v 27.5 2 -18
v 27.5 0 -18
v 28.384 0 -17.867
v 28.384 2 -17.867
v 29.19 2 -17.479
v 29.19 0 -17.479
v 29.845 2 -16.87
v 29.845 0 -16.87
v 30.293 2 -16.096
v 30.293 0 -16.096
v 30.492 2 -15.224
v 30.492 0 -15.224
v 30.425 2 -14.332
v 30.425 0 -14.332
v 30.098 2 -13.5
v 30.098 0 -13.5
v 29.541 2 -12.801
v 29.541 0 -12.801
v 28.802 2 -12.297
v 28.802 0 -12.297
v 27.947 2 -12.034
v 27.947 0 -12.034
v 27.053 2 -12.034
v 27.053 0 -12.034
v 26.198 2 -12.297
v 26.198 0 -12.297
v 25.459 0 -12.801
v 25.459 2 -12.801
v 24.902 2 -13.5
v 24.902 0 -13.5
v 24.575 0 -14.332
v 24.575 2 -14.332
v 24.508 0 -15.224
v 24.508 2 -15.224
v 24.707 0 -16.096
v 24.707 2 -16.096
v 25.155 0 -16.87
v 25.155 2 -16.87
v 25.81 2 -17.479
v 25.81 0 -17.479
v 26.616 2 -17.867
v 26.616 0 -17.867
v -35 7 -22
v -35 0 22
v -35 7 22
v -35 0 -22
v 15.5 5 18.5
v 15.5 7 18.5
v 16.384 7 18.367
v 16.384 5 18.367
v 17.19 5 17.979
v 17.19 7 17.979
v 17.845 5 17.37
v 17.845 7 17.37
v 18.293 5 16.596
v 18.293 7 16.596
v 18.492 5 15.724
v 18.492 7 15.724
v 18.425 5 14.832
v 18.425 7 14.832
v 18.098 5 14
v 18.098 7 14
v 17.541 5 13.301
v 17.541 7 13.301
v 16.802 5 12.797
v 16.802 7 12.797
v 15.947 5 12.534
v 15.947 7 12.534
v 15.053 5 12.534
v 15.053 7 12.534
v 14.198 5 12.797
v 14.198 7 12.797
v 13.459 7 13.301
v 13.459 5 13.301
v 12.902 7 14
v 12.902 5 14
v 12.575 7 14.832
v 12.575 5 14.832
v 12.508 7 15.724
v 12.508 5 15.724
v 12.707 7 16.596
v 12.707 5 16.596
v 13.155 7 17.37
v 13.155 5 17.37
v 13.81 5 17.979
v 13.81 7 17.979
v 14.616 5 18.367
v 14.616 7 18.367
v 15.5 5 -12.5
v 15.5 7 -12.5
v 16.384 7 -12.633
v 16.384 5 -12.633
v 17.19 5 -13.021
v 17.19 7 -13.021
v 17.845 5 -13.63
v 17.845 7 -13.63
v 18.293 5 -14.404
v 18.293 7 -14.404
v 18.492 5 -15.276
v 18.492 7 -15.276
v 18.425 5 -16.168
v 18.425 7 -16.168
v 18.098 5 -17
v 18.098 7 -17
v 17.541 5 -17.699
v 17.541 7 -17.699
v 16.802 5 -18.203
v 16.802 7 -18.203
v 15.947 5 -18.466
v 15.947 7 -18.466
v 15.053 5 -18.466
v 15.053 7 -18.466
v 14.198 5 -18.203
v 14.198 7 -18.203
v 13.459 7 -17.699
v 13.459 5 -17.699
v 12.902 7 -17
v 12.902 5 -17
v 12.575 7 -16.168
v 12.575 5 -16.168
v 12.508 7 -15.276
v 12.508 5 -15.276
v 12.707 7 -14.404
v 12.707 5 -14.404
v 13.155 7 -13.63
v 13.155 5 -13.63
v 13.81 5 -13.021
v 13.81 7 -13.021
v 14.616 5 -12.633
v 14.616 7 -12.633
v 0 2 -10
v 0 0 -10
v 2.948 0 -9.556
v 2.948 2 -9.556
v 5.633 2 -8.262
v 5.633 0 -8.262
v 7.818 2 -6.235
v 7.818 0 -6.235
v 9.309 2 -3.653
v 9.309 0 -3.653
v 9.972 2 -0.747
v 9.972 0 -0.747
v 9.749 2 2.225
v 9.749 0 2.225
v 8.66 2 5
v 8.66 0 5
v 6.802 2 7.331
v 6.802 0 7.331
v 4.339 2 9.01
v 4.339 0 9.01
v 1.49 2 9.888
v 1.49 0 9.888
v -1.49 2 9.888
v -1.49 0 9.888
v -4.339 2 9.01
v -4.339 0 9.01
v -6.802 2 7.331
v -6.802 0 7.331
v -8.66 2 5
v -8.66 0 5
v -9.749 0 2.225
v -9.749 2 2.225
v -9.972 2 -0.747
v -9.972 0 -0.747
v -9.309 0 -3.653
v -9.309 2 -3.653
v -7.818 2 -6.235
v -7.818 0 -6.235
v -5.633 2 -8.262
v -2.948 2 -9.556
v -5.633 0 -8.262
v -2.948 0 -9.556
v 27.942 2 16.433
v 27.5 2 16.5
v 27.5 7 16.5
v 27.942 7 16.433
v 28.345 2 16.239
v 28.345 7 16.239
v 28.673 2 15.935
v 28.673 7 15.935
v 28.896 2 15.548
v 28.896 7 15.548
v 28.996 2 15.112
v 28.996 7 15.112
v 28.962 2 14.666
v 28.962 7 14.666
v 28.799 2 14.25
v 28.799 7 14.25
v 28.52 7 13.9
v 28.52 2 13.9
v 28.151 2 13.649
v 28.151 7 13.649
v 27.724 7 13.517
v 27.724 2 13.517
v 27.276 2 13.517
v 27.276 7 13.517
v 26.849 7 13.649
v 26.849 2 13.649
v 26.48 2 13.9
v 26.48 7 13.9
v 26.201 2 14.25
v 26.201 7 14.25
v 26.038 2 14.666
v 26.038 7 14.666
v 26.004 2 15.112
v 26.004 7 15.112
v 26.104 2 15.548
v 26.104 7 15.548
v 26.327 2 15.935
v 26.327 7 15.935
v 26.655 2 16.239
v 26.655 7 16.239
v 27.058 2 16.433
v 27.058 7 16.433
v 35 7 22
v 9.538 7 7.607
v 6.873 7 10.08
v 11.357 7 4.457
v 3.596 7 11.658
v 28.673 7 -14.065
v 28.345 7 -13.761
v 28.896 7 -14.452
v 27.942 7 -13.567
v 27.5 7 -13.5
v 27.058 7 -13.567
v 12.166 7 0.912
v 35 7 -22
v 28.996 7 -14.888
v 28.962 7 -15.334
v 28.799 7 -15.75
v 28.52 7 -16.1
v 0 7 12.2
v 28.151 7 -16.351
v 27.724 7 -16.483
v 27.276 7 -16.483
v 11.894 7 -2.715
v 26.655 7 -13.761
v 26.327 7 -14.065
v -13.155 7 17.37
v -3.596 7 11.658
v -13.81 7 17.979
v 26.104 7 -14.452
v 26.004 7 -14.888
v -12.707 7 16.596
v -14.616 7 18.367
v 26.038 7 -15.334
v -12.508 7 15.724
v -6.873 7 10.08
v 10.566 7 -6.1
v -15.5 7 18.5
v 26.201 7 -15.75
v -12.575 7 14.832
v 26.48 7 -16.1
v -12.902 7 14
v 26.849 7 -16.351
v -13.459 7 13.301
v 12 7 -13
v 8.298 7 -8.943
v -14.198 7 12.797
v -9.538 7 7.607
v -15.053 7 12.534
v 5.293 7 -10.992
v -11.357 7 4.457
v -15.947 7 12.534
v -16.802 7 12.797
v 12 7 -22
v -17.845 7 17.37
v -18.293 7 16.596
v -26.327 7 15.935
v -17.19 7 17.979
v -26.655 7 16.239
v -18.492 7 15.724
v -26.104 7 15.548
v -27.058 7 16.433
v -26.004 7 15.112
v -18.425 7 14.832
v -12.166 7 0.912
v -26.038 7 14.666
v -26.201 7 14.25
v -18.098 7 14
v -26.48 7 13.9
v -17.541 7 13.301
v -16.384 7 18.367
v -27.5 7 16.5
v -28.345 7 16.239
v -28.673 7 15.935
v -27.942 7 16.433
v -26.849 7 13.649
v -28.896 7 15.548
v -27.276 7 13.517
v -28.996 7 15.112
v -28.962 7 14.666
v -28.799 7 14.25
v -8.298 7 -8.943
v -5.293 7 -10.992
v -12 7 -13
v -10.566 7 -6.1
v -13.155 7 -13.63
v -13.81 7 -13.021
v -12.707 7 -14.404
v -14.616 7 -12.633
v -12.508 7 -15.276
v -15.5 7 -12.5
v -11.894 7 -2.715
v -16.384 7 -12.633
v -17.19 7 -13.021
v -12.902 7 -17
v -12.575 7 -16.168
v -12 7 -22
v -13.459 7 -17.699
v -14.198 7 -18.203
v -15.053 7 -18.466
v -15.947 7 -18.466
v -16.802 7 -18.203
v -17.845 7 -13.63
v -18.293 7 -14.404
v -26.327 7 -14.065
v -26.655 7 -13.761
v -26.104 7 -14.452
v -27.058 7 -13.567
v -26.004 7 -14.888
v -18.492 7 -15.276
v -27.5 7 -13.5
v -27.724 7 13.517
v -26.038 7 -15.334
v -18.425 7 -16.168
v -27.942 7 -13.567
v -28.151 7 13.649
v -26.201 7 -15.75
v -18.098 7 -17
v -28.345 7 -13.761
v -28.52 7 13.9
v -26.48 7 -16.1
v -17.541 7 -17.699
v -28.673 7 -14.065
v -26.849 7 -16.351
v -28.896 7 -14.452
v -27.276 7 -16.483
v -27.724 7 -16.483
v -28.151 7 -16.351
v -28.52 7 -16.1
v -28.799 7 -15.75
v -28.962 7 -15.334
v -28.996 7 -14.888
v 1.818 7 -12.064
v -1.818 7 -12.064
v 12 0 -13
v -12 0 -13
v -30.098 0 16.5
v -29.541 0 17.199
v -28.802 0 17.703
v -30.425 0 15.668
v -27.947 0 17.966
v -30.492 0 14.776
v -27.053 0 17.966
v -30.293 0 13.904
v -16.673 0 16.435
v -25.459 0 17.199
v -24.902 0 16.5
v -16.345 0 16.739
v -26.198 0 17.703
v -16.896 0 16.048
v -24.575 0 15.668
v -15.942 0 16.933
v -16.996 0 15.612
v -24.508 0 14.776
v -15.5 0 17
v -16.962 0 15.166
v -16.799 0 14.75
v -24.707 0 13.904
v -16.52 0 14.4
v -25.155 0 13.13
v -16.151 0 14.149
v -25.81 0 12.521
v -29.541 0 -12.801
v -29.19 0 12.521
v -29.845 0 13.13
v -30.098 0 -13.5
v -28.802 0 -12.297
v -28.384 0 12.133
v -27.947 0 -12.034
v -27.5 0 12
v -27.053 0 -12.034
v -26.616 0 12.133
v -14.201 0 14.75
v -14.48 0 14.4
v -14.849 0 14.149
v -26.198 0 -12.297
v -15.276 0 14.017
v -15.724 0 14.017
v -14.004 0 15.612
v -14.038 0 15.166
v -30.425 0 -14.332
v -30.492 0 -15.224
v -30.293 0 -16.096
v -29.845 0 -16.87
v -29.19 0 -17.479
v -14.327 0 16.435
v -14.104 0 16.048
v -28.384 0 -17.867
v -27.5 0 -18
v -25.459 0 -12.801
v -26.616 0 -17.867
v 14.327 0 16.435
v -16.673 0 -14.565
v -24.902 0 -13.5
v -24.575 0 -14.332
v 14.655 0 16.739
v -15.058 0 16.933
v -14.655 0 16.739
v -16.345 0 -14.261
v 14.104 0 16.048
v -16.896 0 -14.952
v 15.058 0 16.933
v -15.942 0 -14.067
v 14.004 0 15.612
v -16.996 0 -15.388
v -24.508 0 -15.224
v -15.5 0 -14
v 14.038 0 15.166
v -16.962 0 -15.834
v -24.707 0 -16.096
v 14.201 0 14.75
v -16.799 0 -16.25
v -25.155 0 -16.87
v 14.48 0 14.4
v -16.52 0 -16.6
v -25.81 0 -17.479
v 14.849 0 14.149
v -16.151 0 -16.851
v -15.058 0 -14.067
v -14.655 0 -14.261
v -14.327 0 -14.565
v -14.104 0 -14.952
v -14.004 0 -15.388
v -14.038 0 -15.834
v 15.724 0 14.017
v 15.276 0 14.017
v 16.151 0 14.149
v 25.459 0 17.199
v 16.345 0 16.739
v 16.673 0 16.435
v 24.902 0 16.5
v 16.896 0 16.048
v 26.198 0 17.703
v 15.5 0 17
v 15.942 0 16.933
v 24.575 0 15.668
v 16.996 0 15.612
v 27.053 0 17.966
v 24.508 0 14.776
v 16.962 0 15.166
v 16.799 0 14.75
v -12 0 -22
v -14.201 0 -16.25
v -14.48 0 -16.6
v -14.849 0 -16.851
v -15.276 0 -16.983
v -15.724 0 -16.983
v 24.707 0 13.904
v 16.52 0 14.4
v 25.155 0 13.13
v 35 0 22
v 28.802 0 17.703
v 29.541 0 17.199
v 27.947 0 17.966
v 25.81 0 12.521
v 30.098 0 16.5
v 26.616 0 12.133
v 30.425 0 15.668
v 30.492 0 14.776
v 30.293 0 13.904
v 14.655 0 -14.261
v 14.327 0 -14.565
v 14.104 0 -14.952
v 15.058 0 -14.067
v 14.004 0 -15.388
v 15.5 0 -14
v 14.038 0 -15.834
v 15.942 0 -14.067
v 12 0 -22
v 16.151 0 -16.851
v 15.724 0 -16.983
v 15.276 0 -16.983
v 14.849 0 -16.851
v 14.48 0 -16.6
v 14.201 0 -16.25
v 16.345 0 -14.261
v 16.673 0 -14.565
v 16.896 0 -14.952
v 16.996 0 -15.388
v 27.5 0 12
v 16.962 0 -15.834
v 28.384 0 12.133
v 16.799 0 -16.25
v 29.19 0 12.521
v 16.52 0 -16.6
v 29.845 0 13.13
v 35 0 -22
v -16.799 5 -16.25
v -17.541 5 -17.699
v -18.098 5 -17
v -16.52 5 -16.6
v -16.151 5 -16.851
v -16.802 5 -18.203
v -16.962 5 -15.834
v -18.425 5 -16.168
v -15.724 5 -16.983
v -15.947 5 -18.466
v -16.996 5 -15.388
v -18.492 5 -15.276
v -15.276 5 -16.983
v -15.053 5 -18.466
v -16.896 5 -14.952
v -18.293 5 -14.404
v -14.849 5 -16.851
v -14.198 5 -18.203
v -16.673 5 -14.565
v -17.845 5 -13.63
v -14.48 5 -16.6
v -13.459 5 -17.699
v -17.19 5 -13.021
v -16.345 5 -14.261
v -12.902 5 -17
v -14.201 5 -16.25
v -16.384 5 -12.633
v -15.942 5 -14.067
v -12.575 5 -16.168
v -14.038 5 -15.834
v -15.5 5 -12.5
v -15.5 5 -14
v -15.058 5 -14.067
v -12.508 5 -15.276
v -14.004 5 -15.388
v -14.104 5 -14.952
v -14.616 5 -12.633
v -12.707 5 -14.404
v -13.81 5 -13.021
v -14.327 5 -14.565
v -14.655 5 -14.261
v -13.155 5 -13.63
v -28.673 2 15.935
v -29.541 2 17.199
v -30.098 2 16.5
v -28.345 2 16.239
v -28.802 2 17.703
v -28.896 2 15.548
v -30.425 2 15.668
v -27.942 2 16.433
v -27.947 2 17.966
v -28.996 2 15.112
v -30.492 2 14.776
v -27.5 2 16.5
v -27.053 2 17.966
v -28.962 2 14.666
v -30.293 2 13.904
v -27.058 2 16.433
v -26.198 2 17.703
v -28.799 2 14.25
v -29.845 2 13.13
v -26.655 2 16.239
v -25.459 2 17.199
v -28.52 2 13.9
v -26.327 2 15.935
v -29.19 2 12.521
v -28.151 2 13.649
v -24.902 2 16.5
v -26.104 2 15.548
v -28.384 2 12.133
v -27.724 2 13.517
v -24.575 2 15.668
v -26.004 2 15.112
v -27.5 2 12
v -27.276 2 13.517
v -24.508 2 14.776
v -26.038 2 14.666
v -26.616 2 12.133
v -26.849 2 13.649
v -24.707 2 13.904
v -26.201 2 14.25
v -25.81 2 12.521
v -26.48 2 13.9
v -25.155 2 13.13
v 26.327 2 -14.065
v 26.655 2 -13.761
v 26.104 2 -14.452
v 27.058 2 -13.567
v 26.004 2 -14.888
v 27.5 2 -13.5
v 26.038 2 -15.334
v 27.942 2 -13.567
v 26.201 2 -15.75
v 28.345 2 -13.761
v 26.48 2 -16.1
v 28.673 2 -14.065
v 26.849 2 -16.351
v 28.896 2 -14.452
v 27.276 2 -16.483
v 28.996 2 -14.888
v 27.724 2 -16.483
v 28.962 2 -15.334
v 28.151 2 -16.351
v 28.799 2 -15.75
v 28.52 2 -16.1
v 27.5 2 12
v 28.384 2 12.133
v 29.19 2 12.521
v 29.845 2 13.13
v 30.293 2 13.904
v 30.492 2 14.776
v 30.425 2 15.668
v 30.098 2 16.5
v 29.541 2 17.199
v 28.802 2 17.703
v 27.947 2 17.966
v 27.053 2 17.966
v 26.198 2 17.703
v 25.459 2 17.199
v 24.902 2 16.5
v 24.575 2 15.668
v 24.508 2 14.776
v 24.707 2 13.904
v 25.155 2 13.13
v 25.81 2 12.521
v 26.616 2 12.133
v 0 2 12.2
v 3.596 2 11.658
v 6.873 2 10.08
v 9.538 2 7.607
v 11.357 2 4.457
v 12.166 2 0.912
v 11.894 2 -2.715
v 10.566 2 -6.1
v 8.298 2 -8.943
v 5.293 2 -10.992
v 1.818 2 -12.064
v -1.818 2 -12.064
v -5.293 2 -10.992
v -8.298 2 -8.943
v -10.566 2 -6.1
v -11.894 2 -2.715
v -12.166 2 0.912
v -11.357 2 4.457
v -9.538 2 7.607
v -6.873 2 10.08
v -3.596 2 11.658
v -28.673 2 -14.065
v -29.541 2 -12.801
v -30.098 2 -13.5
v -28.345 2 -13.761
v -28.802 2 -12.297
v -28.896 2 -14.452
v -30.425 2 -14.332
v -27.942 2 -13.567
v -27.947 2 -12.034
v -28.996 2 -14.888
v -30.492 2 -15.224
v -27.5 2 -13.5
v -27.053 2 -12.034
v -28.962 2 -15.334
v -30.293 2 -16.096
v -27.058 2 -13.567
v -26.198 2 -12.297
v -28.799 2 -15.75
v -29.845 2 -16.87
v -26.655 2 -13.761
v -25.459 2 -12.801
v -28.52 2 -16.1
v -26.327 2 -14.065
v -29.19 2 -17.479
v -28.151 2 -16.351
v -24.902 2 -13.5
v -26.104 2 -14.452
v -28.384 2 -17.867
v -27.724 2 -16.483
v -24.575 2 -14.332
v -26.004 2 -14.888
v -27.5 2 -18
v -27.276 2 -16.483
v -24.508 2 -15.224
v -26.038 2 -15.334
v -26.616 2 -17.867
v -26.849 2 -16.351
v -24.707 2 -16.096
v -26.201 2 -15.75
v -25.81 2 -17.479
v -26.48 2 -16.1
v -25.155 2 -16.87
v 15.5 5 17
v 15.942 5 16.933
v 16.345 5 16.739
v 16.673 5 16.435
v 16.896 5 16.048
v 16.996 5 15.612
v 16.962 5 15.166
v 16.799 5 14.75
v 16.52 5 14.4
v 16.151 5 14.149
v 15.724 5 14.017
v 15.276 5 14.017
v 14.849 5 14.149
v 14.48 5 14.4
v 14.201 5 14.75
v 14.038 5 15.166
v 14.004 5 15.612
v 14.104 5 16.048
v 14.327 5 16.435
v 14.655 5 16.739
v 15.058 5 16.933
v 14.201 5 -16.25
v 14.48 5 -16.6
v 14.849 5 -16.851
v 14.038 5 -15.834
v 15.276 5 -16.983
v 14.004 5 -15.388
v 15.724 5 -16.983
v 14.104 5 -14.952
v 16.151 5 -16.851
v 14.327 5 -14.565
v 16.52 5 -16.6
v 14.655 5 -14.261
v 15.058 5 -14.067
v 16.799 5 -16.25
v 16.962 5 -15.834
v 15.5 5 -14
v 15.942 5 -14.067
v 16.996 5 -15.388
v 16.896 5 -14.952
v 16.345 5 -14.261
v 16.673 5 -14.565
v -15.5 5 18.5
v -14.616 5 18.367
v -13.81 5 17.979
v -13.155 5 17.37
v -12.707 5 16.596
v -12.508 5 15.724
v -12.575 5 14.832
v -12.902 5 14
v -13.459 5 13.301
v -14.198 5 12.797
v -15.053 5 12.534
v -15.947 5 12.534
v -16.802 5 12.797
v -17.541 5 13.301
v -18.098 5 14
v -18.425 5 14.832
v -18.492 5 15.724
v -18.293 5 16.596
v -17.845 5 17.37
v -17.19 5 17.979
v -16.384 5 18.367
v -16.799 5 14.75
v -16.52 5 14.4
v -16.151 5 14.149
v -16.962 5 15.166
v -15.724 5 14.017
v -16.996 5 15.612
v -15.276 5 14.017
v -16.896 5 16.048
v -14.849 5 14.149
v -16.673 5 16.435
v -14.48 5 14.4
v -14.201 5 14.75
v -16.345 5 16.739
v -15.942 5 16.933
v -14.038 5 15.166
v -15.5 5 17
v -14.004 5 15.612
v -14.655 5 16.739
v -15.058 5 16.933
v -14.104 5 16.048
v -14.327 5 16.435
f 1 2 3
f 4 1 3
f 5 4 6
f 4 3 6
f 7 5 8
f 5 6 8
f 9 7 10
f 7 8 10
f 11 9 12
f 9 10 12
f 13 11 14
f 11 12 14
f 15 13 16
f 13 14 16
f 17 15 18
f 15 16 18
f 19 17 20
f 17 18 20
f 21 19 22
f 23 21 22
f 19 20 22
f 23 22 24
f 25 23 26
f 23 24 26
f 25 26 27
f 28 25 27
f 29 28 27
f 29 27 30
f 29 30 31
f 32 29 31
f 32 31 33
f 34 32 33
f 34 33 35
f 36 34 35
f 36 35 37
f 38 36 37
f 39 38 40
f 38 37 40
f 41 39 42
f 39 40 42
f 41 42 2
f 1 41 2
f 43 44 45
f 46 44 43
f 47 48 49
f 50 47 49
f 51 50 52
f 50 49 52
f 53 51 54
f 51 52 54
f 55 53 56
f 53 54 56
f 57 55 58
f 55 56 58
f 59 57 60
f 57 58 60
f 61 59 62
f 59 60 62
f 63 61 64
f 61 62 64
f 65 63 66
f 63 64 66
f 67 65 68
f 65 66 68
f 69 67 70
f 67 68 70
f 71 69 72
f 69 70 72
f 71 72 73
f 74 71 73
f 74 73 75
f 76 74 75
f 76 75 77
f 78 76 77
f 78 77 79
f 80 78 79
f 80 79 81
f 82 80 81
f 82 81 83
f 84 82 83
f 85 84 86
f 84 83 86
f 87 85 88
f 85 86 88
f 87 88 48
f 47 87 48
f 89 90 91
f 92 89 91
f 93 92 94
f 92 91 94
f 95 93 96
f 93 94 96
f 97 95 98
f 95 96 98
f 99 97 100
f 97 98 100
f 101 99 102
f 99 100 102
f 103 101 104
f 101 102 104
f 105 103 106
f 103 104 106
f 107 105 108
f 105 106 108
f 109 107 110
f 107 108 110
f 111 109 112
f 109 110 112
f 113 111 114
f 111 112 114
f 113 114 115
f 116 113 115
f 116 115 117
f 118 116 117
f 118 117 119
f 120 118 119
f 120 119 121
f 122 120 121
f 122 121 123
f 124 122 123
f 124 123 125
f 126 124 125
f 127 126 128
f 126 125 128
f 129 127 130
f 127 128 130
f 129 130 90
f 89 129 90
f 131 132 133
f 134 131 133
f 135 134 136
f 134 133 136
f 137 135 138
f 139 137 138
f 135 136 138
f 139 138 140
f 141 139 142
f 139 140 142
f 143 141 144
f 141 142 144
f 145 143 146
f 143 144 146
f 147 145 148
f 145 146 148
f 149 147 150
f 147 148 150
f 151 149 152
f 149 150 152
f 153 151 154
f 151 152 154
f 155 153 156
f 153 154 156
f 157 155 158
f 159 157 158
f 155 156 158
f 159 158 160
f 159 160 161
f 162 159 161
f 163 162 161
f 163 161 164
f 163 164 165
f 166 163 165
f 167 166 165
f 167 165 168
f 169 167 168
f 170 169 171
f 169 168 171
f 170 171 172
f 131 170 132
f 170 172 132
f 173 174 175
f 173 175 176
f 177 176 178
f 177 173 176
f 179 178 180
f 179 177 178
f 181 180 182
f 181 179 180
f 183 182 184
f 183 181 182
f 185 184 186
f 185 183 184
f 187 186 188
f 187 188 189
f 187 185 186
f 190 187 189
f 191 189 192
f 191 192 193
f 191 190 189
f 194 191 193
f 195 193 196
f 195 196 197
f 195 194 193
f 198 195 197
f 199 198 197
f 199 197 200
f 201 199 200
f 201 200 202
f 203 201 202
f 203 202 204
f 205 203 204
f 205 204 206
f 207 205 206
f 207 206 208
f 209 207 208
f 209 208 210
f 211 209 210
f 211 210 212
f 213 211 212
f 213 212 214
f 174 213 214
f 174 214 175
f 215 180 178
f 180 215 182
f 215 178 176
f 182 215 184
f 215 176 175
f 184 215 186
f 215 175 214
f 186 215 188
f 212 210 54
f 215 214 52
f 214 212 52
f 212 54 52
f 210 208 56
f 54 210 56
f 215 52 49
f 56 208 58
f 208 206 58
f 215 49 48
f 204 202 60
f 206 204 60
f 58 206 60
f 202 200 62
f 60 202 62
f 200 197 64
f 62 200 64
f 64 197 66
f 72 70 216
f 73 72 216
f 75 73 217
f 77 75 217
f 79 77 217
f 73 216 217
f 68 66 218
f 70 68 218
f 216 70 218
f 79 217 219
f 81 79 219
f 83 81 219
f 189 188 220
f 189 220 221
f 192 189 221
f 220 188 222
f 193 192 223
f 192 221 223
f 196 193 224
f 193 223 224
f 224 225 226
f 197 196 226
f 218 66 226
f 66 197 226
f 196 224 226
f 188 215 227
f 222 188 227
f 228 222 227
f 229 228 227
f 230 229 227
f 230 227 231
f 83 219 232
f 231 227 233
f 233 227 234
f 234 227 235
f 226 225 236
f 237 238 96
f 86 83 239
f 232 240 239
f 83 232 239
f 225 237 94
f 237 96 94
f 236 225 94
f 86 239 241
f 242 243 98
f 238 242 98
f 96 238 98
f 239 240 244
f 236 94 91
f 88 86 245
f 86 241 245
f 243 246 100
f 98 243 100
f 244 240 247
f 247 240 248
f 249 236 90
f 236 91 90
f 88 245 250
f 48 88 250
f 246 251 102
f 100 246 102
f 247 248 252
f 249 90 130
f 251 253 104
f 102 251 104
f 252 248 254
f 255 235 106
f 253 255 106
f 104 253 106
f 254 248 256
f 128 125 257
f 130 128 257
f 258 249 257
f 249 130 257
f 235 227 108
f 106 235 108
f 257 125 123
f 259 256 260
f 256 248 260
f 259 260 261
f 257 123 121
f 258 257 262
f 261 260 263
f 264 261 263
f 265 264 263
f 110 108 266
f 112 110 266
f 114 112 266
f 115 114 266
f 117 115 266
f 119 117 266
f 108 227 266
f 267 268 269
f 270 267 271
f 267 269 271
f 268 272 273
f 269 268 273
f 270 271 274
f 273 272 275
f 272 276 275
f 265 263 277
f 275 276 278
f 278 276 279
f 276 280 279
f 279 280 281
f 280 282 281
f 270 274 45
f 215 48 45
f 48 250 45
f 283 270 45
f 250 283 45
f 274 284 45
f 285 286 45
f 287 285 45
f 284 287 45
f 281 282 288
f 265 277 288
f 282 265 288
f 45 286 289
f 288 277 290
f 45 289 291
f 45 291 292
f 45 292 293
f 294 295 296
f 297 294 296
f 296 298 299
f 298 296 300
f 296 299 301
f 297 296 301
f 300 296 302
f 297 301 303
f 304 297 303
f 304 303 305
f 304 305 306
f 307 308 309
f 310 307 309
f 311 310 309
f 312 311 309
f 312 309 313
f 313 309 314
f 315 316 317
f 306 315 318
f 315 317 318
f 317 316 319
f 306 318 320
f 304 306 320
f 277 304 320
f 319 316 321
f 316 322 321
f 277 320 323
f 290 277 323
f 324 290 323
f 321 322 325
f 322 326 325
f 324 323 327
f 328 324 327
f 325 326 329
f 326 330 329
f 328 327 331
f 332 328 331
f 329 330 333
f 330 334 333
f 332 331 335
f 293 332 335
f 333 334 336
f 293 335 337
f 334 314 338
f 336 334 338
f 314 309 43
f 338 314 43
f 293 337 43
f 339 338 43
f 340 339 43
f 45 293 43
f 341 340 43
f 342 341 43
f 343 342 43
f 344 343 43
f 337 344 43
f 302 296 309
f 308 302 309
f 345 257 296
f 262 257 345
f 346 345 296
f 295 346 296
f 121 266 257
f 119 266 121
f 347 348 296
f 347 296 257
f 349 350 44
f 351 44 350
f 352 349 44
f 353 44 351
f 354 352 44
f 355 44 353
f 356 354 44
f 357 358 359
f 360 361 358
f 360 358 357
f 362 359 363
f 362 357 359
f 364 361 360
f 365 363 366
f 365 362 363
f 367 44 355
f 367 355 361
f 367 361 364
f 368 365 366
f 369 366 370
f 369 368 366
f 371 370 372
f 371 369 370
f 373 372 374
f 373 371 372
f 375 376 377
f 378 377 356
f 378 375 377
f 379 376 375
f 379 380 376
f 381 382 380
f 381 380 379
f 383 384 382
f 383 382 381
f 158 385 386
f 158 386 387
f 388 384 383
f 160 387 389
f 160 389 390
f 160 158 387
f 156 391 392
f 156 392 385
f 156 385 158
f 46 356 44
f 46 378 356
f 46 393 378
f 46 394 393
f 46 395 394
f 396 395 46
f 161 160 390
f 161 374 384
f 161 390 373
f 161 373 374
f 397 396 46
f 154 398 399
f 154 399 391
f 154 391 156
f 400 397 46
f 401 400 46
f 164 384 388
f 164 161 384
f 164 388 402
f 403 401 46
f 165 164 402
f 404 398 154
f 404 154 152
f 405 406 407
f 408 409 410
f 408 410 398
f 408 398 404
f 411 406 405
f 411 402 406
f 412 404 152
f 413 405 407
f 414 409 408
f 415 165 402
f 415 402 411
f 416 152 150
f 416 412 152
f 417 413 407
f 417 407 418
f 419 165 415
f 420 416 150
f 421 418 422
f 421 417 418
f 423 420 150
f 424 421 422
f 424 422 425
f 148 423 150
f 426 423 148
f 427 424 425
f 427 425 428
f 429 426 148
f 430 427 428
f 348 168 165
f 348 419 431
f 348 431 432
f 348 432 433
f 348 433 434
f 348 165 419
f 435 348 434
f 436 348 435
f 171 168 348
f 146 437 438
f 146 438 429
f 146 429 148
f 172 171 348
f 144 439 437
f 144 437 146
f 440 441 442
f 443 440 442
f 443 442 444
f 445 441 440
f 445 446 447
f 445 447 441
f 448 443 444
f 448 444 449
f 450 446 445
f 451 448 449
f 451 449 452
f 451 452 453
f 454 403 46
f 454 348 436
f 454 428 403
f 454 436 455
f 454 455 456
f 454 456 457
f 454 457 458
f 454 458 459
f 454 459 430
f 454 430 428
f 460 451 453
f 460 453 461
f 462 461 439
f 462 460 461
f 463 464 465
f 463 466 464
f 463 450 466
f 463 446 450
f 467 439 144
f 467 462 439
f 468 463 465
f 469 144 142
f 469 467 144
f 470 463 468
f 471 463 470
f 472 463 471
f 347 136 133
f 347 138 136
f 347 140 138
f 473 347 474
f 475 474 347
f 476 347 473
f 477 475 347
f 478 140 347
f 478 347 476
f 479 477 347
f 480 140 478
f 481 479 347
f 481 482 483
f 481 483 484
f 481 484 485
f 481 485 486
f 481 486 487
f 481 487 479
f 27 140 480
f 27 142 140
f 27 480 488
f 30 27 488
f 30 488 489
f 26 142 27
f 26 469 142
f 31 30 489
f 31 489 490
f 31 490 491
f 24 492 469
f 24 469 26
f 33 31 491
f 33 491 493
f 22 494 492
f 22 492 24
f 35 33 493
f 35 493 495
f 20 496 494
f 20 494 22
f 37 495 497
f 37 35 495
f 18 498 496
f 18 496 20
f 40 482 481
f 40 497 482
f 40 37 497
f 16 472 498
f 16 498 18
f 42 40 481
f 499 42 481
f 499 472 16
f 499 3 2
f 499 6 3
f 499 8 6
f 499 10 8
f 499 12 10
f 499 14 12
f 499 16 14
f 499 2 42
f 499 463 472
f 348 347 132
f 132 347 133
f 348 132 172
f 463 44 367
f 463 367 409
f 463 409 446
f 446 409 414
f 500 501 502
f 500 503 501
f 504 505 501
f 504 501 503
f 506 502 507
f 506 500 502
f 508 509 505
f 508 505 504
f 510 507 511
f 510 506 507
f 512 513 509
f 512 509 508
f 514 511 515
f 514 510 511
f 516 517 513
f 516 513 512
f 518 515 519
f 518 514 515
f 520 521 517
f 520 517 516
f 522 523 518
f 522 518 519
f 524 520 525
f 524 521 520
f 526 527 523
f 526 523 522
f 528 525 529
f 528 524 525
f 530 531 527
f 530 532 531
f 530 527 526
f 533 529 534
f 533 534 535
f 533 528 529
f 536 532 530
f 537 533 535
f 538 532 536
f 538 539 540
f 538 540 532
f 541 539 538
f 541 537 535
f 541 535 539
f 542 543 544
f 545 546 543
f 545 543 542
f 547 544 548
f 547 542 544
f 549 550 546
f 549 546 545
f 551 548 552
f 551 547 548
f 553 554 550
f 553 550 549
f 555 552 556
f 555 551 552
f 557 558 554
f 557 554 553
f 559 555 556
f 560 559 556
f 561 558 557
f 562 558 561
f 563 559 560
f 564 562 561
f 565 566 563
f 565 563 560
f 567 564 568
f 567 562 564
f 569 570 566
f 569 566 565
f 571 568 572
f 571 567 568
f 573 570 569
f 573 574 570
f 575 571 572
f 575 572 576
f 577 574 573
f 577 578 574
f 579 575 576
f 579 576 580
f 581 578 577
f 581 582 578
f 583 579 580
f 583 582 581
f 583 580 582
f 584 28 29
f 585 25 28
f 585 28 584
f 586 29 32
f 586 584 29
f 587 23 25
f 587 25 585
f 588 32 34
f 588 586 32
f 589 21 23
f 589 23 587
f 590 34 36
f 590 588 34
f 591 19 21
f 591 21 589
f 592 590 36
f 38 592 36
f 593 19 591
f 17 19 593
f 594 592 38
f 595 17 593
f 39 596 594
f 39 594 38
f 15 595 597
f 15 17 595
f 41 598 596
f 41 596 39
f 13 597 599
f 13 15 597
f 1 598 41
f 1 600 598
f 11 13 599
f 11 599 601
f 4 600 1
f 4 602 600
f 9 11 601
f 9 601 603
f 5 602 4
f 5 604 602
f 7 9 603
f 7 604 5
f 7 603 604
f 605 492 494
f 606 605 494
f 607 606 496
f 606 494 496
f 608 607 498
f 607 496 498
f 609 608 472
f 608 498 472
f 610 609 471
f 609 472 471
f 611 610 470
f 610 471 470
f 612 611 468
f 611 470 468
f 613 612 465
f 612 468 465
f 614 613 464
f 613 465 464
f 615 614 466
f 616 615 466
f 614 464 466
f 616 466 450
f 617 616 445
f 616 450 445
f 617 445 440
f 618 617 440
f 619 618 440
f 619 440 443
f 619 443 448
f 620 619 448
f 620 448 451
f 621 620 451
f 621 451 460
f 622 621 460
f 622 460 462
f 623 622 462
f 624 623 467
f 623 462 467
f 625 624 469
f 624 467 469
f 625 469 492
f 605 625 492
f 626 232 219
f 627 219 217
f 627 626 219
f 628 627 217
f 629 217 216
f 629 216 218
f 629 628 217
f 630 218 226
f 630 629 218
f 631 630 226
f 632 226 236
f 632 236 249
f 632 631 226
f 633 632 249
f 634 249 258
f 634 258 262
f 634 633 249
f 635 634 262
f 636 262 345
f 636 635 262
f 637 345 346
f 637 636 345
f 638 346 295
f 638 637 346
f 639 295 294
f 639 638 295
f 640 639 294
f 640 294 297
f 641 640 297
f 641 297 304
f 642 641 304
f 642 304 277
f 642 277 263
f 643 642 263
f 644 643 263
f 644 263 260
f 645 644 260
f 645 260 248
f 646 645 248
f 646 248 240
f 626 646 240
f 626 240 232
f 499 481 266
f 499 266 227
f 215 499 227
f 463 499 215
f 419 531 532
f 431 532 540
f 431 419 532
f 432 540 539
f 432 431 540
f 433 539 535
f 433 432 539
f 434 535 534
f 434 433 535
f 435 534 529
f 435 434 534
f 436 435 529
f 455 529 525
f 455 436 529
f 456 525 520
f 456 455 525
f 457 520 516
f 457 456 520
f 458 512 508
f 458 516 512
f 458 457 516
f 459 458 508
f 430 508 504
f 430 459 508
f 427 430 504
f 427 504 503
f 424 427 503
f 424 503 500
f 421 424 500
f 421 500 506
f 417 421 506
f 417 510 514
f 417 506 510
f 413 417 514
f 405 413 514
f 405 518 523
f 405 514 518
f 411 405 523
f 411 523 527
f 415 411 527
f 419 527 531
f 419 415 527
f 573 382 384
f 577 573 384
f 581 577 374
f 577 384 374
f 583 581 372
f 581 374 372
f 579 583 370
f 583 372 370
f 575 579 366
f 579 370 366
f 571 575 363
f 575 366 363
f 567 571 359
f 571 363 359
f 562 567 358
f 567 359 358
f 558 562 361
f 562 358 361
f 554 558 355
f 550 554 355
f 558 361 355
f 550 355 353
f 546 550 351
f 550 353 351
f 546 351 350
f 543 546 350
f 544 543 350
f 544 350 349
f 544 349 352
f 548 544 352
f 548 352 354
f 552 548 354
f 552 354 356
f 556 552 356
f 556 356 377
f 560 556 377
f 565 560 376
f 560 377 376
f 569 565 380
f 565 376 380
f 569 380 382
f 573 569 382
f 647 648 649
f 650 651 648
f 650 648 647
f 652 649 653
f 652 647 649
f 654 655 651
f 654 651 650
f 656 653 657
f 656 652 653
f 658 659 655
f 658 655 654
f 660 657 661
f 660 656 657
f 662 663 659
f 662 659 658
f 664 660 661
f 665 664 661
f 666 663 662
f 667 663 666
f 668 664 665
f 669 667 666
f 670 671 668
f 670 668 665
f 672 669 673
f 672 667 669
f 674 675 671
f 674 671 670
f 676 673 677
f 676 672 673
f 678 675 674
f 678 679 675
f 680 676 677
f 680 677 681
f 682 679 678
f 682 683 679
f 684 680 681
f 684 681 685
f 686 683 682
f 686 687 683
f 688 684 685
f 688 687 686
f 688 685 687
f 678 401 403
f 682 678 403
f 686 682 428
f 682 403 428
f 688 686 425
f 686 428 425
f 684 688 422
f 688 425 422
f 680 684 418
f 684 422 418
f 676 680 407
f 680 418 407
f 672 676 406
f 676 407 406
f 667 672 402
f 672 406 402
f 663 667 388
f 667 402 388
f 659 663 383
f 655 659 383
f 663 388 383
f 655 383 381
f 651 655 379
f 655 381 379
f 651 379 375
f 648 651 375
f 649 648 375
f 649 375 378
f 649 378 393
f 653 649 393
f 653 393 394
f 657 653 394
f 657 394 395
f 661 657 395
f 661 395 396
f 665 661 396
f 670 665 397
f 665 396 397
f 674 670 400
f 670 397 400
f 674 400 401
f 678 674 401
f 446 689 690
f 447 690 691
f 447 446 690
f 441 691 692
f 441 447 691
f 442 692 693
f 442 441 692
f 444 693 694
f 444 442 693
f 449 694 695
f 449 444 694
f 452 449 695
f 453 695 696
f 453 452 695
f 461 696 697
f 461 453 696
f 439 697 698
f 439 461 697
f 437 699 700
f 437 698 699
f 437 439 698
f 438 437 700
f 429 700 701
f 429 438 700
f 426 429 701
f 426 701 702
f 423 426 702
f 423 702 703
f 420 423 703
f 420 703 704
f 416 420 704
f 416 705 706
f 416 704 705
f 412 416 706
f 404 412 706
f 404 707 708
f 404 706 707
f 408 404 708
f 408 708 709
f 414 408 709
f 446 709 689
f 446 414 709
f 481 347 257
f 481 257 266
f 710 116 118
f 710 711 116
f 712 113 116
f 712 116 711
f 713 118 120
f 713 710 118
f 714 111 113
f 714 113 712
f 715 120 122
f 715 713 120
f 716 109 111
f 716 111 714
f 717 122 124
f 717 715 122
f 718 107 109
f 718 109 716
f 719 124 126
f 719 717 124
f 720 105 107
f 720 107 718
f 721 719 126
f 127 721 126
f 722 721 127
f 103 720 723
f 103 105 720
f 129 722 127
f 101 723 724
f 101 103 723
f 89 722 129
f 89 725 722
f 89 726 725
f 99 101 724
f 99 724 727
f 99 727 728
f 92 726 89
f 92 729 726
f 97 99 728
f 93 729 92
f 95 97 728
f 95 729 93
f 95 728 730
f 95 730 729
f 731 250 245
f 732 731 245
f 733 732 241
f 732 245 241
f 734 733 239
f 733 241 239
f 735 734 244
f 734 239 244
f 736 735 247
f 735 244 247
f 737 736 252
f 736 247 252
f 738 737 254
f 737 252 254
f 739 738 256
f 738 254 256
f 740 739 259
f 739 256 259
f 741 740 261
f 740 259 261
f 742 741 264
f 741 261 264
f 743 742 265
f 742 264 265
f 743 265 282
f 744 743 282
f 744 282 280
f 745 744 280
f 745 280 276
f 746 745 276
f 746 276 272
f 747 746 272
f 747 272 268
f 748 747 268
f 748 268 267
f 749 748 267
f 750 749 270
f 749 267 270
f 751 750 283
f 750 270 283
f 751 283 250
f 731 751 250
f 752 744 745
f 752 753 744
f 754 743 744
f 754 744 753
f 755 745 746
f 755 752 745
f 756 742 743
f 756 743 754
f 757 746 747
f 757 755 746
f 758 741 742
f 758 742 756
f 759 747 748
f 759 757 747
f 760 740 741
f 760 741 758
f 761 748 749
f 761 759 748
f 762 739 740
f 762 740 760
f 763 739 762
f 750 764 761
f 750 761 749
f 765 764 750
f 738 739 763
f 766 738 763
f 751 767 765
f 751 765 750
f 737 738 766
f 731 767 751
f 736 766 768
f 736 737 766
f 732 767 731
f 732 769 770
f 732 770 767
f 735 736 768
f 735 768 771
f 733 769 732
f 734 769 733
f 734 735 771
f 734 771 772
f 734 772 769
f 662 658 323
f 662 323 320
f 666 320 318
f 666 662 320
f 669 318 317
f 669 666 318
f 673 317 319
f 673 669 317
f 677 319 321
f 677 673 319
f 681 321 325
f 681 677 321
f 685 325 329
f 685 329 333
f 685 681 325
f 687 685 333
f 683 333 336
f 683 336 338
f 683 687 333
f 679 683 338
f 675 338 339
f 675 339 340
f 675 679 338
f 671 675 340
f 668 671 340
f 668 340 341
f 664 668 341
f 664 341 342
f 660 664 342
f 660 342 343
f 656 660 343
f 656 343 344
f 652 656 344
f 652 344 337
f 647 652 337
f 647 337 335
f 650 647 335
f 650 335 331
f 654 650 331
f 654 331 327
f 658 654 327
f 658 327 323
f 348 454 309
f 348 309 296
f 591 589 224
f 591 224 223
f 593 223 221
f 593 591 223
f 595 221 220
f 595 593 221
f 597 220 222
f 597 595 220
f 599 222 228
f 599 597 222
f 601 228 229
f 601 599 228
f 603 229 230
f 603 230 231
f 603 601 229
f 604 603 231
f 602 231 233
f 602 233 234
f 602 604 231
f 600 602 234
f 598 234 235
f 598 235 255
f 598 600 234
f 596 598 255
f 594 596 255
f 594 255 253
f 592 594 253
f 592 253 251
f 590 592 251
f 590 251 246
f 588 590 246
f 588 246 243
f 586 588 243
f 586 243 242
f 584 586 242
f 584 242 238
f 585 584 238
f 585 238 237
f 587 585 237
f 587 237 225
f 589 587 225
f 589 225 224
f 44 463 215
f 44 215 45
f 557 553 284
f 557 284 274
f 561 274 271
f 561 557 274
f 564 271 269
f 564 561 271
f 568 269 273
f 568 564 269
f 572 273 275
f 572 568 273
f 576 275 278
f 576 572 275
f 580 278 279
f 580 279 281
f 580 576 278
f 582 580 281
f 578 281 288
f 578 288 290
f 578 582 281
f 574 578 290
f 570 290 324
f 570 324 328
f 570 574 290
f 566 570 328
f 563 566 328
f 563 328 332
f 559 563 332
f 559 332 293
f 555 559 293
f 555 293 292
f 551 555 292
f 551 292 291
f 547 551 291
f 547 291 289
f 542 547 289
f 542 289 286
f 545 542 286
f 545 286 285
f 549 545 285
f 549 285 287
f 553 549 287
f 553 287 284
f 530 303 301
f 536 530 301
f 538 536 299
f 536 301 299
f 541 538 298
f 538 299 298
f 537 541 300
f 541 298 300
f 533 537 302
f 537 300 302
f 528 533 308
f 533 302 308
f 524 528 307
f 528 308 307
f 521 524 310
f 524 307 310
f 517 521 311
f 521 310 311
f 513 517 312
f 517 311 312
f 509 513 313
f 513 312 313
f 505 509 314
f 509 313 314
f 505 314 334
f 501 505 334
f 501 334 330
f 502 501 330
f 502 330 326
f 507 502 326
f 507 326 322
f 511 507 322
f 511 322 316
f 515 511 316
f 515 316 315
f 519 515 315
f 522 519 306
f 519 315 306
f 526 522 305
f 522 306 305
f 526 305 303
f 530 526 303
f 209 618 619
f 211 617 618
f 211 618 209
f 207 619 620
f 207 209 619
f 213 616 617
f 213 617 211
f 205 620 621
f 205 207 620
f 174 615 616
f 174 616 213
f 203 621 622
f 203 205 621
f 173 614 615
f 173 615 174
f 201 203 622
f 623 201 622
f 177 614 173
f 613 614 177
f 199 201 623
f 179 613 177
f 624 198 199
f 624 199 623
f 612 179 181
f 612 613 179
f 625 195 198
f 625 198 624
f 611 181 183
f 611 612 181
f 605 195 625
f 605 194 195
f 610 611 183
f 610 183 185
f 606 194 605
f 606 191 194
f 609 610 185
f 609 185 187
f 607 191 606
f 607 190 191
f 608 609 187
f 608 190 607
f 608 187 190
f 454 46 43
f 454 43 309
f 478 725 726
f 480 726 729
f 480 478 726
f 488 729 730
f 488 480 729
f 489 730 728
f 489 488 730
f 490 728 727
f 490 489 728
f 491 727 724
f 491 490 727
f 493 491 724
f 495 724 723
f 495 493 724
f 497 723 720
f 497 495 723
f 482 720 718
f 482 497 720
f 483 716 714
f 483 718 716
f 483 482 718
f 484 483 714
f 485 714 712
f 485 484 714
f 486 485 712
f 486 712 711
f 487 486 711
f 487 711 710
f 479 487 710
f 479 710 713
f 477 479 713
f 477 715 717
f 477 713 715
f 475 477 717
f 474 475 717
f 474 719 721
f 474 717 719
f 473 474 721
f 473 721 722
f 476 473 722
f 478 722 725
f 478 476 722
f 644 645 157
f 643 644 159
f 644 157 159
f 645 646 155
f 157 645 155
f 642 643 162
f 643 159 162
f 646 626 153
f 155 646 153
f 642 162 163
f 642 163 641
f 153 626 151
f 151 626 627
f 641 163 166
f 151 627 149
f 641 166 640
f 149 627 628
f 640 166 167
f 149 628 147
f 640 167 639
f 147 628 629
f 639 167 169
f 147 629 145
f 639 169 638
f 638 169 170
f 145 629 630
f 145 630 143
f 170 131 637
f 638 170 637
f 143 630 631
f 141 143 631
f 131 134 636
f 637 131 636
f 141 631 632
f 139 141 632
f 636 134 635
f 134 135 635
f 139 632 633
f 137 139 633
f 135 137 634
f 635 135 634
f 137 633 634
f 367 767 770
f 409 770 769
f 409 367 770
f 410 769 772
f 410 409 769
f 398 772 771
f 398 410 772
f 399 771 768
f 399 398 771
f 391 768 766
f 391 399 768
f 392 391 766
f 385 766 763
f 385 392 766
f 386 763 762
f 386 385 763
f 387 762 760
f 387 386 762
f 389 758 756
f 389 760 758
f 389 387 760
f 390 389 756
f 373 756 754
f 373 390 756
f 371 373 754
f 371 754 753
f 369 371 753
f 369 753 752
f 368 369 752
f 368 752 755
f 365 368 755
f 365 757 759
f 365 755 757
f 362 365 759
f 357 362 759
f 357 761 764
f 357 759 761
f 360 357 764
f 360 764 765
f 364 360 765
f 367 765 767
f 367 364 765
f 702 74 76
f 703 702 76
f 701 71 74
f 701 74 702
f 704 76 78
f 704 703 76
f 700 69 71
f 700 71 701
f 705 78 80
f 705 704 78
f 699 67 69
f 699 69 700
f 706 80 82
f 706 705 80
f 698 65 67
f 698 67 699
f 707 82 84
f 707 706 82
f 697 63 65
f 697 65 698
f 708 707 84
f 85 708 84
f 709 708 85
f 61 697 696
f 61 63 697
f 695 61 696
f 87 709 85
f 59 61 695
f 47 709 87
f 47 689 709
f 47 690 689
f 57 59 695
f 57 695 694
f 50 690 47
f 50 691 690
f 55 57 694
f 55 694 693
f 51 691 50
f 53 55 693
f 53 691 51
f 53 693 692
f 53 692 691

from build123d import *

# Parameters (mm, degrees)
SKETCH1_R           = 12.2
SKETCH1_R_2         = 1.5
BOSS_EXTRUDE1_DEPTH = 7
SKETCH2_R           = 12.2
SKETCH2_R_2         = 10
BOSS_EXTRUDE2_DEPTH = 2
SKETCH3_R           = 3
CUT_EXTRUDE1_DEPTH  = 2
SKETCH4_R           = 3
CUT_EXTRUDE2_DEPTH  = 2


with BuildPart() as part:
    # Sketch1 → Boss-Extrude1 (new body)
    with BuildSketch(Plane(origin=(0, 0, 0), x_dir=(1, 0, 0), z_dir=(0, 1, 0))):
        Polygon((-12, 22), (-12, 13), (12, 13), (12, 22), (35, 22), (35, -22), (-35, -22), (-35, 22), align=None)
        with Locations(Location((0, 0, 0), (0, 0, 270))):
            Circle(SKETCH1_R, mode=Mode.SUBTRACT)
        with Locations(Location((27.5, -15, 0), (0, 0, 270))):
            Circle(SKETCH1_R_2, mode=Mode.SUBTRACT)
        with Locations(Location((27.5, 15, 0), (0, 0, 270))):
            Circle(SKETCH1_R_2, mode=Mode.SUBTRACT)
        with Locations(Location((-27.5, -15, 0), (0, 0, 270))):
            Circle(SKETCH1_R_2, mode=Mode.SUBTRACT)
        with Locations(Location((-27.5, 15, 0), (0, 0, 270))):
            Circle(SKETCH1_R_2, mode=Mode.SUBTRACT)
        with Locations(Location((15.5, -15.5, 0), (0, 0, 270))):
            Circle(SKETCH1_R_2, mode=Mode.SUBTRACT)
        with Locations(Location((-15.5, -15.5, 0), (0, 0, 270))):
            Circle(SKETCH1_R_2, mode=Mode.SUBTRACT)
        with Locations(Location((15.5, 15.5, 0), (0, 0, 270))):
            Circle(SKETCH1_R_2, mode=Mode.SUBTRACT)
        with Locations(Location((-15.5, 15.5, 0), (0, 0, 270))):
            Circle(SKETCH1_R_2, mode=Mode.SUBTRACT)
    extrude(amount=BOSS_EXTRUDE1_DEPTH)

    # Sketch2 → Boss-Extrude2 (add)
    with BuildSketch(Plane.XZ):
        with Locations(Location((0, 0, 0), (0, 0, 270))):
            Circle(SKETCH2_R)
        with Locations(Location((0, 0, 0), (0, 0, 270))):
            Circle(SKETCH2_R_2, mode=Mode.SUBTRACT)
    extrude(amount=-BOSS_EXTRUDE2_DEPTH)

    # Sketch3 → Cut-Extrude1 (cut)
    with BuildSketch(Plane.XZ):
        with Locations(Location((-27.5, 15, 0), (0, 0, 270))):
            Circle(SKETCH3_R)
        with Locations(Location((-27.5, -15, 0), (0, 0, 270))):
            Circle(SKETCH3_R)
        with Locations(Location((27.5, 15, 0), (0, 0, 270))):
            Circle(SKETCH3_R)
        with Locations(Location((27.5, -15, 0), (0, 0, 270))):
            Circle(SKETCH3_R)
    extrude(amount=-CUT_EXTRUDE1_DEPTH, mode=Mode.SUBTRACT)

    # Sketch4 → Cut-Extrude2 (cut)
    with BuildSketch(Plane(origin=(0, 7, 0), x_dir=(1, 0, 0), z_dir=(0, 1, 0))):
        with Locations(Location((15.5, -15.5, 0), (0, 0, 270))):
            Circle(SKETCH4_R)
        with Locations(Location((-15.5, -15.5, 0), (0, 0, 270))):
            Circle(SKETCH4_R)
        with Locations(Location((15.5, 15.5, 0), (0, 0, 270))):
            Circle(SKETCH4_R)
        with Locations(Location((-15.5, 15.5, 0), (0, 0, 270))):
            Circle(SKETCH4_R)
    extrude(amount=-CUT_EXTRUDE2_DEPTH, mode=Mode.SUBTRACT)


solid = part.part
